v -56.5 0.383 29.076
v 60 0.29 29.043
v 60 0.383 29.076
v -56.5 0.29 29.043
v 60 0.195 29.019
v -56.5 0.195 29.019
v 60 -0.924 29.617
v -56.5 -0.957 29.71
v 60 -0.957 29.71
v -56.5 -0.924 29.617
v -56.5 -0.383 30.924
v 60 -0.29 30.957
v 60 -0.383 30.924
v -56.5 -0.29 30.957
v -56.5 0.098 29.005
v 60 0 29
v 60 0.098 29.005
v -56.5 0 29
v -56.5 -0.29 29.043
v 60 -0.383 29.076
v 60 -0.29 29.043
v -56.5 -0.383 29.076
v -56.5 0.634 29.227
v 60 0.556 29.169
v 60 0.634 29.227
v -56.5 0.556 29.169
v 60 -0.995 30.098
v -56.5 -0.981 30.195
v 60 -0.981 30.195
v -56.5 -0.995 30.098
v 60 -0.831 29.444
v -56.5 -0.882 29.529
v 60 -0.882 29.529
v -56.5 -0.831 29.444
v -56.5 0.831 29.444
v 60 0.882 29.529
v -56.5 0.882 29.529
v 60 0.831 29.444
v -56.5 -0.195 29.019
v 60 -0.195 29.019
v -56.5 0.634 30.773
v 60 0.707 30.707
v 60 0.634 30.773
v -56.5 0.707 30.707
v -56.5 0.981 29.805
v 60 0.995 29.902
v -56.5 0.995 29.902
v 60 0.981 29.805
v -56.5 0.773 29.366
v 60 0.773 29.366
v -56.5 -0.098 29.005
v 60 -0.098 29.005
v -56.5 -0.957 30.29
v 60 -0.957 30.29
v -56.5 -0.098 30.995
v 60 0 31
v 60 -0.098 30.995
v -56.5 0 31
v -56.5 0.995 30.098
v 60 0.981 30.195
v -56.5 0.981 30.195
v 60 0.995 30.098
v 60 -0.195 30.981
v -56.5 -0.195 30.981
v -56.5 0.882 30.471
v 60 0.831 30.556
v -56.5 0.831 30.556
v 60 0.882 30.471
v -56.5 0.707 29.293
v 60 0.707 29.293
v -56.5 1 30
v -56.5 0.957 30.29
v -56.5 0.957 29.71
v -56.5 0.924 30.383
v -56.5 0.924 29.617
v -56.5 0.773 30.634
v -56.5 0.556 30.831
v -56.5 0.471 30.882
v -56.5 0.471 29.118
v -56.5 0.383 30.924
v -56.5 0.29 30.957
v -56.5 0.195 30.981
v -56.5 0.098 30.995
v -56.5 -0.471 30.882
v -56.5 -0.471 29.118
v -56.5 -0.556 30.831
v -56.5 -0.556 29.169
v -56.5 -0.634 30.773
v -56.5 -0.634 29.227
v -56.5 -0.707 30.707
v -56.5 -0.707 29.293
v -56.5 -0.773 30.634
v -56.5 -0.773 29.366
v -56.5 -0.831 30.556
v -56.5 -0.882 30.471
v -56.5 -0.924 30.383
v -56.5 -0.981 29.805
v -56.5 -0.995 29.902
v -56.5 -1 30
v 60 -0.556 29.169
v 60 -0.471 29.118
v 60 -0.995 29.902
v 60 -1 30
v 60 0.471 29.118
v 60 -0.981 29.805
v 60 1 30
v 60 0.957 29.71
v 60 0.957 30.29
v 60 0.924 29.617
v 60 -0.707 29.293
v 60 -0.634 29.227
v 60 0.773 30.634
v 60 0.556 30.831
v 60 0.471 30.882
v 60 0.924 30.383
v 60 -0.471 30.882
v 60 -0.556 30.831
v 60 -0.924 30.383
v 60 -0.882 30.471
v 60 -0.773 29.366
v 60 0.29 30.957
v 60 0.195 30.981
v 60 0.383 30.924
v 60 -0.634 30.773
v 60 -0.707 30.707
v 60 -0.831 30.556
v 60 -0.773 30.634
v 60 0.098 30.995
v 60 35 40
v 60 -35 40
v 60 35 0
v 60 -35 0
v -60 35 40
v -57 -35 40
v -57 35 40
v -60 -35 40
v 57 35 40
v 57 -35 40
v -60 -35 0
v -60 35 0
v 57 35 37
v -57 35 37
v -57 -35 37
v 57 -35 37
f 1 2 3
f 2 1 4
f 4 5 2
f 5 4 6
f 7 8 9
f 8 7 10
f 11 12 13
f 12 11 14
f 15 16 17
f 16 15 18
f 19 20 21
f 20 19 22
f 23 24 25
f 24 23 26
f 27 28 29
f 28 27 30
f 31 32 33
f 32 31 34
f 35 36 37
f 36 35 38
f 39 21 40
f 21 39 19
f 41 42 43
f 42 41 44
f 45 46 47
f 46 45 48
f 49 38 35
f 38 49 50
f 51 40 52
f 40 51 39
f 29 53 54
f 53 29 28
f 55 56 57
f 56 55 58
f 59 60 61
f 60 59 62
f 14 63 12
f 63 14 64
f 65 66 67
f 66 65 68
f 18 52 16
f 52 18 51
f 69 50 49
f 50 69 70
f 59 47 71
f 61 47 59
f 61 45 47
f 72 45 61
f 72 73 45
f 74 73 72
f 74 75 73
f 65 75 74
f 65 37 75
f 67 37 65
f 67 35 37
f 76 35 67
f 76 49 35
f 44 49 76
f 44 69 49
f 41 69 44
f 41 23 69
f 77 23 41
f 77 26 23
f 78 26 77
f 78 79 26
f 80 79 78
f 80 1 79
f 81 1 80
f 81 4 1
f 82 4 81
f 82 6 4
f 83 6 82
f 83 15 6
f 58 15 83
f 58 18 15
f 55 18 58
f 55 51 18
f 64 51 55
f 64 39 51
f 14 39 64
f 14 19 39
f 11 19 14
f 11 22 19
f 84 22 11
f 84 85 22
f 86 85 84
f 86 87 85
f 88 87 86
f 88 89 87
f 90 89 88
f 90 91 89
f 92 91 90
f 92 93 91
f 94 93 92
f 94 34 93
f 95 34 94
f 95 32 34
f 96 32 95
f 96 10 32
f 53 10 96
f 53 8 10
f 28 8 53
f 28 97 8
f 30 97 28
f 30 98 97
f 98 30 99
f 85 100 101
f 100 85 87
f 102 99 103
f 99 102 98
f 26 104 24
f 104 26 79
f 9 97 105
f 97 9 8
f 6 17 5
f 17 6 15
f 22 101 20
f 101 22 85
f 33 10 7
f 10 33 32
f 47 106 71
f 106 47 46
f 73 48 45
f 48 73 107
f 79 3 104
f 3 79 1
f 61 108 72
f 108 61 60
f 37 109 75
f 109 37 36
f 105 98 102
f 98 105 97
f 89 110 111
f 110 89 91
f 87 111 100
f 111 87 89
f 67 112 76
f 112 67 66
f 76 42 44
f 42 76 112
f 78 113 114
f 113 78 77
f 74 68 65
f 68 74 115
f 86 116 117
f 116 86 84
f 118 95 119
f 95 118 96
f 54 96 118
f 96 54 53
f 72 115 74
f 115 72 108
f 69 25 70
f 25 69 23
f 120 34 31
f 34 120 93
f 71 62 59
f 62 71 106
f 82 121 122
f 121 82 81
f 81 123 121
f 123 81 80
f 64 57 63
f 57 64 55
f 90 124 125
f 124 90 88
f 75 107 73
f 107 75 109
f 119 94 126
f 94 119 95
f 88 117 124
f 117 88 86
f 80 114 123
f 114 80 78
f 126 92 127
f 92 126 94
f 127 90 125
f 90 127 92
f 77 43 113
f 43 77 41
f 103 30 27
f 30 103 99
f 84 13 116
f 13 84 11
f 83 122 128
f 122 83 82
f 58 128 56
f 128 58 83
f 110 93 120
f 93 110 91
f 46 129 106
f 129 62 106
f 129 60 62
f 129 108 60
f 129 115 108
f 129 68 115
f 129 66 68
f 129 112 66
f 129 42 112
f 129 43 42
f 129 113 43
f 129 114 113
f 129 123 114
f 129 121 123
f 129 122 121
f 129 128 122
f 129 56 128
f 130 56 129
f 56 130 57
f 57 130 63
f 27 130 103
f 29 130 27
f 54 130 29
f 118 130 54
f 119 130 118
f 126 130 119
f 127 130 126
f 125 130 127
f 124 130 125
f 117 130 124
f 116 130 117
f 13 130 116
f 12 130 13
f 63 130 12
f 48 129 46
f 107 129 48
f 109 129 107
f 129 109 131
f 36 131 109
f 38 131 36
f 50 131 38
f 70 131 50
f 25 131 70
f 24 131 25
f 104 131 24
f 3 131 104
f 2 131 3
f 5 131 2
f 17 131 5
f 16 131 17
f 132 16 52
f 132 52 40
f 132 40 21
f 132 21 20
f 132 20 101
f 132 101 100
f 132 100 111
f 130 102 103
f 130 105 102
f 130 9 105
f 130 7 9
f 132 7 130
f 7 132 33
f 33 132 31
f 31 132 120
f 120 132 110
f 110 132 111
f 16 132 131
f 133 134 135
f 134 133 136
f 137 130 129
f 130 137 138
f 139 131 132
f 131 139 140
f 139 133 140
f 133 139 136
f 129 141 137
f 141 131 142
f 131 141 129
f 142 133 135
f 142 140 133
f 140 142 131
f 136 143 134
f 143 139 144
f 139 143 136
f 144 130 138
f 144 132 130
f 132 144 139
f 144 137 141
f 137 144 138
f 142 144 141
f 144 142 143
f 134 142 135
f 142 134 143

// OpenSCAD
// Mini horizontal gel-electrophoresis box - buffer tank
// Print orientation: tank resting on XY plane, open top facing +Z

// ---------- Parameters ----------
outer_x      = 120;   // outer length in X (mm)
outer_y      = 70;    // outer width in Y (mm)
outer_z      = 40;    // outer height in Z (mm)
wall         = 3;     // wall thickness (mm)
floor        = 3;     // floor thickness (mm)
platform_x   = 60;    // platform length in X (mm)
platform_y   = outer_y; // platform spans full inner width (mm)
platform_top = 13;    // platform top height above outer bottom (mm)
hole_d       = 2;     // electrode hole diameter (mm)
hole_y       = 0;     // electrode hole Y position (mm)
hole_z       = 30;    // electrode hole Z position (mm)
eps          = 0.5;   // cutter overshoot past faces (mm)

$fn = 64;

// ---------- Derived ----------
inner_x = outer_x - 2 * wall;   // 114 mm
inner_z = outer_z - floor;      // 37 mm (floor at z = 0..3)

// ---------- Model ----------
difference() {
    // Tank body
    translate([-outer_x / 2, -outer_y / 2, 0])
        cube([outer_x, outer_y, outer_z]);

    // Open top (empty space above inner floor)
    translate([-inner_x / 2, -platform_y / 2, inner_z])
        cube([inner_x, platform_y, outer_z - inner_z + eps]);

    // Raised gel-tray platform
    translate([-inner_x / 2, -platform_y / 2, inner_z])
        cube([platform_x, platform_y, platform_top - inner_z + wall]);

    // Electrode holes through end walls, along X
    for (sx = [-1, 1])
        translate([sx * (inner_x / 2 - eps), hole_y, hole_z])
            rotate([0, 90, 0])
                cylinder(d = hole_d, h = inner_x + 2 * eps);
}
